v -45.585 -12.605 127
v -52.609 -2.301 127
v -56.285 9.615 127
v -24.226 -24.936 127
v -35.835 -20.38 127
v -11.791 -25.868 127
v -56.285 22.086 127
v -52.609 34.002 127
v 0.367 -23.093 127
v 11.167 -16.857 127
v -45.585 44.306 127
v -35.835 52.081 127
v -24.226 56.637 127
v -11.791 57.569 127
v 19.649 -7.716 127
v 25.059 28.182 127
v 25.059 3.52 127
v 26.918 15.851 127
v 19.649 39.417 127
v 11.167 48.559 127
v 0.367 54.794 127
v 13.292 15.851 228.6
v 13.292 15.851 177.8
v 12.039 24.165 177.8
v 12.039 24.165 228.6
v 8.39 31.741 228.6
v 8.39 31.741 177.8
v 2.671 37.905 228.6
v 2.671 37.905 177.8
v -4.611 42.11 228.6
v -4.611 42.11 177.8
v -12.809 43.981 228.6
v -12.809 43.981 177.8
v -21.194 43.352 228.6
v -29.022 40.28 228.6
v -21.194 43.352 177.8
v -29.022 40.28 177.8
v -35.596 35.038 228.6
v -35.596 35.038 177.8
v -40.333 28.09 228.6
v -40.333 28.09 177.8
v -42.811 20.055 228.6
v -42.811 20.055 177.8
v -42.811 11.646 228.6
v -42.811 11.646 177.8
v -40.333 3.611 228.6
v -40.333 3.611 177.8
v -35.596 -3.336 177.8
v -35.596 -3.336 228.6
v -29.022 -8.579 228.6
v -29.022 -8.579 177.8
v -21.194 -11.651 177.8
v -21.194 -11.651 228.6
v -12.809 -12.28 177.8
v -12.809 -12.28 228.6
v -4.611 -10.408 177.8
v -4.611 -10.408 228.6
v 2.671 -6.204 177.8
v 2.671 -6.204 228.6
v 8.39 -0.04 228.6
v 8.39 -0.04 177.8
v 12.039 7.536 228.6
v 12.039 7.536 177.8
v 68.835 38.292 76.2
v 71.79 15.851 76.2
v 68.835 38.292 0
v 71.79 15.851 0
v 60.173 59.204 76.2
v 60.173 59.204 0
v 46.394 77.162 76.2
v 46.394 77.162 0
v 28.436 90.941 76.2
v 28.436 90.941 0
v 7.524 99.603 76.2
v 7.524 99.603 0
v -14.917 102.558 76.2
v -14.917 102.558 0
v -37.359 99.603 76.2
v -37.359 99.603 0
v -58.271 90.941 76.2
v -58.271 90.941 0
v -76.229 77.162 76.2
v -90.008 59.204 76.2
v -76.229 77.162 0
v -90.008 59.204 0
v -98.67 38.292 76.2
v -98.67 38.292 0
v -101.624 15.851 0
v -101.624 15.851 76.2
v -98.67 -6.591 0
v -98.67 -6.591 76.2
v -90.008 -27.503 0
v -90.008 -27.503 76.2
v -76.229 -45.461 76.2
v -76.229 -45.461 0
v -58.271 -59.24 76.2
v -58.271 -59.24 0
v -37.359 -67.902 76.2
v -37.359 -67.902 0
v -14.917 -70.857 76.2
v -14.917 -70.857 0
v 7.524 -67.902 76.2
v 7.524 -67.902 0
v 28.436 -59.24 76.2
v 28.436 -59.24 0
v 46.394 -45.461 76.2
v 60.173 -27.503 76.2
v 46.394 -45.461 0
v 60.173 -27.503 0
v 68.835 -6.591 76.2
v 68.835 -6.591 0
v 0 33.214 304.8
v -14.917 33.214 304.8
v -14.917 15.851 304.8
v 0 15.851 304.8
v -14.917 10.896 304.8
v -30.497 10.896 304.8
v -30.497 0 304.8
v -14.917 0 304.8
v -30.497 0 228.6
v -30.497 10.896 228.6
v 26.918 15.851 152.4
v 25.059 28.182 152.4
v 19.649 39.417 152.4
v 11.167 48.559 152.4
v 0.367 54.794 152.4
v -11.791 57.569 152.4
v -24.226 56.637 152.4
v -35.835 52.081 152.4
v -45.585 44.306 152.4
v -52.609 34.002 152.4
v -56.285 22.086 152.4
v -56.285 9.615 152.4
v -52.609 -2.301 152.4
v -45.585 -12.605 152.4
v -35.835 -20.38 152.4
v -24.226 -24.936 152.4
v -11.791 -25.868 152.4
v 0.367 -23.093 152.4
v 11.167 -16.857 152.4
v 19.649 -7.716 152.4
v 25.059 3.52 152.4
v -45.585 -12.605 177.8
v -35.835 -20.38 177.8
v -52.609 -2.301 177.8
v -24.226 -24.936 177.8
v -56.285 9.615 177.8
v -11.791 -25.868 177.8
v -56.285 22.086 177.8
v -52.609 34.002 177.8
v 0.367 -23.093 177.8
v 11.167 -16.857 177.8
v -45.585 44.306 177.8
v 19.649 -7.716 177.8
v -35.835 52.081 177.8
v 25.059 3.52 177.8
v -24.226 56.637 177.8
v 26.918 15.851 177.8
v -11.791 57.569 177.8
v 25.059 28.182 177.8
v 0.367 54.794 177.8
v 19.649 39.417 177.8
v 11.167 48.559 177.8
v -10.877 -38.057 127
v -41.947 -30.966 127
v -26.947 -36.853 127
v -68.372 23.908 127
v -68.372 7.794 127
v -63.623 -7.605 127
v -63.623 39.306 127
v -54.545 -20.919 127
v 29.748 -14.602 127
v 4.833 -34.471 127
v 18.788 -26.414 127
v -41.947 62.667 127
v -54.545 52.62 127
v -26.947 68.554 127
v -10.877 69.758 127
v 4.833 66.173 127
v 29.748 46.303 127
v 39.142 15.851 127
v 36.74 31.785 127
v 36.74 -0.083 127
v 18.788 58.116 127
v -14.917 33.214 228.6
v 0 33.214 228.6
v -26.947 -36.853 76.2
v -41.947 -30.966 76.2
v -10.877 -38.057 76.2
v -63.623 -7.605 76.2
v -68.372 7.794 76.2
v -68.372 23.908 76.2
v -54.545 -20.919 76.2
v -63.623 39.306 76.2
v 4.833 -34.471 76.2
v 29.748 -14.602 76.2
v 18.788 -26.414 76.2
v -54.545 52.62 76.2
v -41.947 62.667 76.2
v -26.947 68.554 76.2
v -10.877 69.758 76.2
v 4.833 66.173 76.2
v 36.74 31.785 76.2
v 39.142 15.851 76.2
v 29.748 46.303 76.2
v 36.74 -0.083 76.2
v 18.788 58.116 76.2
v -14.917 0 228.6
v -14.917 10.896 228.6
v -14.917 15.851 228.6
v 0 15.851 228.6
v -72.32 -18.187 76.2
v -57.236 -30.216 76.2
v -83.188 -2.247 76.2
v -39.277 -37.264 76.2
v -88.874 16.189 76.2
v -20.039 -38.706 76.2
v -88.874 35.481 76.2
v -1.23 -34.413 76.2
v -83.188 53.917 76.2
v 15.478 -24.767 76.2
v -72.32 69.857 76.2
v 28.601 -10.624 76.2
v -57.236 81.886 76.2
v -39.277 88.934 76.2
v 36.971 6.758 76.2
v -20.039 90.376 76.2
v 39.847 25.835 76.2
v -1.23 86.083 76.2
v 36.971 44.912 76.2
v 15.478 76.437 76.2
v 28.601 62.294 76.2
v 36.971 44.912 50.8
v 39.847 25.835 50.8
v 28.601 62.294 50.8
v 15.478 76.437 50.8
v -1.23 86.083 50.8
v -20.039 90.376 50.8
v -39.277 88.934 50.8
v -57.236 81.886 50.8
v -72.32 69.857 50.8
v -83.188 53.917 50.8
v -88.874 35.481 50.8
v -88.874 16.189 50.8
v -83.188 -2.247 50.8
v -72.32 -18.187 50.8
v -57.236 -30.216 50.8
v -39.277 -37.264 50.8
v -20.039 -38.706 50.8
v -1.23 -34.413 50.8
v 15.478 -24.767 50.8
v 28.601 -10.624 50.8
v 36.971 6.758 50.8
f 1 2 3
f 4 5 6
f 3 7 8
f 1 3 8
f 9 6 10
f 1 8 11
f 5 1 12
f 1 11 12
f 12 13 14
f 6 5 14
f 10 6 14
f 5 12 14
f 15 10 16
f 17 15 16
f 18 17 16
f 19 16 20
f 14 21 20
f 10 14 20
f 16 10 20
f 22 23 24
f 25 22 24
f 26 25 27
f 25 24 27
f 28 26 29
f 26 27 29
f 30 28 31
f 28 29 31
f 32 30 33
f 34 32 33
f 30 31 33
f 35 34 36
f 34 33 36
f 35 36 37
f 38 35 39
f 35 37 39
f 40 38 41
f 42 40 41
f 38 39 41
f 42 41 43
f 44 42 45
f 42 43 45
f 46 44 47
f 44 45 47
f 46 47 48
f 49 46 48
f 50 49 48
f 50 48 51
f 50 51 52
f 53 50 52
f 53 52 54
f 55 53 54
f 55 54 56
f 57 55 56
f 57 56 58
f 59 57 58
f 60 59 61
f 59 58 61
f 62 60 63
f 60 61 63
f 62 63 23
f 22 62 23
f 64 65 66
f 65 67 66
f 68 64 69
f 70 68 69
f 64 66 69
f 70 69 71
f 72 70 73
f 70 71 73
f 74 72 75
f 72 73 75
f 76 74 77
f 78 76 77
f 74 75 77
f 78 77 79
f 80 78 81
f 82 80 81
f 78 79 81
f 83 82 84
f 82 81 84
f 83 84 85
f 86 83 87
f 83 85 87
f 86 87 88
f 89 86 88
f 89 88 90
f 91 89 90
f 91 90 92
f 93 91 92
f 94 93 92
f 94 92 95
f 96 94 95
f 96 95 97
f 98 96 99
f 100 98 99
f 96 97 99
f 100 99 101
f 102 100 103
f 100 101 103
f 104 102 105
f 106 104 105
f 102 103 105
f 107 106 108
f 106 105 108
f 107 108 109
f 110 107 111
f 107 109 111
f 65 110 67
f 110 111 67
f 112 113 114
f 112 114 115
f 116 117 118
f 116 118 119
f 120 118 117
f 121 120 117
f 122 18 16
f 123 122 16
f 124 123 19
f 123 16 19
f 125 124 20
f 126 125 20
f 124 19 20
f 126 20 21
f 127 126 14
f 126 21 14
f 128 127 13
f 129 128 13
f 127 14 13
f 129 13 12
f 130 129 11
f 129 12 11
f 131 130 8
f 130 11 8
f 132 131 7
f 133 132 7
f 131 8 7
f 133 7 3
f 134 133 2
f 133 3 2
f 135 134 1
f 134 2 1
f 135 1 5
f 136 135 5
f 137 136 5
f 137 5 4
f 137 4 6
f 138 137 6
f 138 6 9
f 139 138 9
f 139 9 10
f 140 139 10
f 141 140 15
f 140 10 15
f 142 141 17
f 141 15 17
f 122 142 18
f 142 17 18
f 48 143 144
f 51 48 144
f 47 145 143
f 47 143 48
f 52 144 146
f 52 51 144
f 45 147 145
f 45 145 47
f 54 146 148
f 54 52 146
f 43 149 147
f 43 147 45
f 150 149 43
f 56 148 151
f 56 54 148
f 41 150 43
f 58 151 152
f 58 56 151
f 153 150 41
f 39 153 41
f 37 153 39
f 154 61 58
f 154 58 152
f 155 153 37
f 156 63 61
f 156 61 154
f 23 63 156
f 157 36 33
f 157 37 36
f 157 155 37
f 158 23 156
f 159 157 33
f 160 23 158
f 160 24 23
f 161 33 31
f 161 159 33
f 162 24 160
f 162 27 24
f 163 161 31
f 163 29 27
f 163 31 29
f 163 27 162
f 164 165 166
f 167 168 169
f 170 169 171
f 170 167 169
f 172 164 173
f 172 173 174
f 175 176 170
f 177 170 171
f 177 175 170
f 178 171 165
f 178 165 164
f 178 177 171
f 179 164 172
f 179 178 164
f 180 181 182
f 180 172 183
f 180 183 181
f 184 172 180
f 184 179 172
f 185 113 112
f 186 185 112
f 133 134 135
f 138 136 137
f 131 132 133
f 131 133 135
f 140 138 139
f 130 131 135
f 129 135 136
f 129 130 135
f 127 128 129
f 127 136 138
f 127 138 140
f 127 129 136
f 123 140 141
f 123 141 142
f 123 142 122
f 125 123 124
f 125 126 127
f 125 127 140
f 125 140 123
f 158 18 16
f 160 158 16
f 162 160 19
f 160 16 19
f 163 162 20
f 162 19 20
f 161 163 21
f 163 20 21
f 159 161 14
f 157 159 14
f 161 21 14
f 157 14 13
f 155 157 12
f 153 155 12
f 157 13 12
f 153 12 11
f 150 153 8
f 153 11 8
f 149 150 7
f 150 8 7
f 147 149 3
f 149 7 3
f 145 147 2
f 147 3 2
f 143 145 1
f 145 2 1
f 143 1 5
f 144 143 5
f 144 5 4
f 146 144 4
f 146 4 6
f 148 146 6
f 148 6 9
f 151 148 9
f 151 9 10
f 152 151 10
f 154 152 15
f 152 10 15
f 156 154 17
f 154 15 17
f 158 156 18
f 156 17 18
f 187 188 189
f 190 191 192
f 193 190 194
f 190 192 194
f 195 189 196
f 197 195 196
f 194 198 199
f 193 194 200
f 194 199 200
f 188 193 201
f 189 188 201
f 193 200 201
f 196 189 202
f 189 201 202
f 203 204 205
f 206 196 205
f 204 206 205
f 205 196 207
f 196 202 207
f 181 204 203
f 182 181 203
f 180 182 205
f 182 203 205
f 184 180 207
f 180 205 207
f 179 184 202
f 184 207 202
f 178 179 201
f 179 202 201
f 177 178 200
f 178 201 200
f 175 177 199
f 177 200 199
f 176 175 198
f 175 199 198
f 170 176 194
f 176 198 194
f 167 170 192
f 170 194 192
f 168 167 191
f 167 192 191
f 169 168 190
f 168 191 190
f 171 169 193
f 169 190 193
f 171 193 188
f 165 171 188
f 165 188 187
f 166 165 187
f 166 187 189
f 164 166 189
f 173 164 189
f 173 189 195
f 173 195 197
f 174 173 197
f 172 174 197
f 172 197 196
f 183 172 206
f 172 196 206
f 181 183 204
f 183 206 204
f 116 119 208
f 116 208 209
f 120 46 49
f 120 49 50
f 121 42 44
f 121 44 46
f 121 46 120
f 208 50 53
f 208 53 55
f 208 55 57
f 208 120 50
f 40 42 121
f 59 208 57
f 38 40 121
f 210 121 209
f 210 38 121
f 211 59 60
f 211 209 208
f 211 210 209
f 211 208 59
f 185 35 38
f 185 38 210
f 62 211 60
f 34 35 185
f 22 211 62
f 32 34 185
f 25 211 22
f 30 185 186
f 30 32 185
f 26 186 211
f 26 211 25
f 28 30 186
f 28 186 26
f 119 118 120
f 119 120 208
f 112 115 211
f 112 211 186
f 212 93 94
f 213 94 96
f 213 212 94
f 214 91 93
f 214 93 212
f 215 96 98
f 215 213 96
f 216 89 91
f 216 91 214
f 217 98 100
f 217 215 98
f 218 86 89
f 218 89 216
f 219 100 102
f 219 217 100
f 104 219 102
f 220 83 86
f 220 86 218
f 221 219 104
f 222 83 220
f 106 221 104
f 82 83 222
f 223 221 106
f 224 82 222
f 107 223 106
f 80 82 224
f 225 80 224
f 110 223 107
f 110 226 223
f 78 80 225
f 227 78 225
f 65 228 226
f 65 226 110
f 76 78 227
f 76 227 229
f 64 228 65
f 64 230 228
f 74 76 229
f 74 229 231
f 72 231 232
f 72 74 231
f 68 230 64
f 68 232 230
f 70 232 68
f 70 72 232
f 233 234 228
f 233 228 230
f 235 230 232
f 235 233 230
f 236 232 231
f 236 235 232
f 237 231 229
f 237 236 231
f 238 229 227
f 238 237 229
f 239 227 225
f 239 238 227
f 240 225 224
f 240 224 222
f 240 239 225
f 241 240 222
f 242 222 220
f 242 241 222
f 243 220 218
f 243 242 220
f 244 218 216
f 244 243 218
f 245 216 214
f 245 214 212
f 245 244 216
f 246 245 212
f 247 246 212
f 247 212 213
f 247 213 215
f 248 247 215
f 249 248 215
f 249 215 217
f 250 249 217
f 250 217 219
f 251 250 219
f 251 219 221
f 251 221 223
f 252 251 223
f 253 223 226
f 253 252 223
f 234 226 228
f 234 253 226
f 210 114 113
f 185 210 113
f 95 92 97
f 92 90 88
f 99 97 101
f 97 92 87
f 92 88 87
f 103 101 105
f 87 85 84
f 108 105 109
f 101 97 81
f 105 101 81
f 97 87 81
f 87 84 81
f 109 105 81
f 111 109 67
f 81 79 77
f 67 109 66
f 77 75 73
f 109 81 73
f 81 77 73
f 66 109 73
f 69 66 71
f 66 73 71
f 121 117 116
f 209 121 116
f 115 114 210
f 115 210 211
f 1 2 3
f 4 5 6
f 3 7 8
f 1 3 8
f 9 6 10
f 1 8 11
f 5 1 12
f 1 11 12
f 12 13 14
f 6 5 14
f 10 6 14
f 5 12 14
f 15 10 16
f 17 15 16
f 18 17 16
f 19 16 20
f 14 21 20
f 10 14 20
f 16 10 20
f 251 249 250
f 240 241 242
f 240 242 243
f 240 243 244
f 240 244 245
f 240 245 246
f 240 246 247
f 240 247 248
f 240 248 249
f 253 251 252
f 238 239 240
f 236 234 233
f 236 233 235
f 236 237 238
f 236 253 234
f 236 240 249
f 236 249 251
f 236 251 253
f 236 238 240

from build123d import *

# Parameters (mm, degrees)
F0_R      = 86.707201
F1_DEPTH  = 50.8
F3_DEPTH  = 25.4
F2_R      = 86.707201
F2_R_2    = 64.721918
F4_DEPTH  = 25.4
F5_R      = 54.058936
F6_DEPTH  = 50.8
F7_R      = 41.835209
F8_DEPTH  = 50.8
F9_DEPTH  = 25.4
F10_R     = 28.209082
F11_DEPTH = 50.8
F12_W     = 14.917269
F12_H     = 17.363571
F13_DEPTH = 76.2
F14_W     = 15.579686
F14_H     = 10.89616
F15_DEPTH = 76.2


with BuildPart() as f1:
    # F0 (on Top) → F1 (new body)
    with BuildSketch(Plane.XY):
        with Locations((-14.917269, 15.850663)):
            Circle(F0_R)
    extrude(amount=F1_DEPTH)

    # F0 (on Top) → F3 (join)
    with BuildSketch(Plane.XY):
        with Locations((-14.917269, 15.850663)):
            Circle(F0_R)
    extrude(amount=F3_DEPTH)

    # F2 (on face) → F4 (join)
    with BuildSketch(Plane.XY.offset(50.8)):
        with Locations((-14.917269, 15.850663)):
            Circle(F2_R)
        with Locations((-24.875257, 25.835115)):
            Circle(F2_R_2, mode=Mode.SUBTRACT)
    extrude(amount=F4_DEPTH)


with BuildPart() as f6:
    # F5 (on face) → F6 (new body)
    with BuildSketch(Plane.XY.offset(76.2)):
        with Locations((-14.917269, 15.850663)):
            Circle(F5_R)
    extrude(amount=F6_DEPTH)


with BuildPart() as f8:
    # F7 (on face) → F8 (new body)
    with BuildSketch(Plane.XY.offset(127)):
        with Locations((-14.917269, 15.850663)):
            Circle(F7_R)
    extrude(amount=F8_DEPTH)

    # F10 (on face) → F11 (join)
    with BuildSketch(Plane.XY.offset(177.8)):
        with Locations((-14.917269, 15.850663)):
            Circle(F10_R)
    extrude(amount=F11_DEPTH)

    # F12 (on face) → F13 (join)
    with BuildSketch(Plane.XY.offset(228.6)):
        with Locations((-7.458634, 24.532448)):
            Rectangle(F12_W, F12_H)
    extrude(amount=F13_DEPTH)

    # F14 (on face) → F15 (join)
    with BuildSketch(Plane.XY.offset(228.6)):
        with Locations((-22.707112, 5.44808)):
            Rectangle(F14_W, F14_H)
    extrude(amount=F15_DEPTH)


with BuildPart() as f9:
    # F7 (on face) → F9 (new body)
    with BuildSketch(Plane.XY.offset(127)):
        with Locations((-14.917269, 15.850663)):
            Circle(F7_R)
    extrude(amount=F9_DEPTH)


solid = Compound([f1.part, f6.part, f8.part, f9.part])
